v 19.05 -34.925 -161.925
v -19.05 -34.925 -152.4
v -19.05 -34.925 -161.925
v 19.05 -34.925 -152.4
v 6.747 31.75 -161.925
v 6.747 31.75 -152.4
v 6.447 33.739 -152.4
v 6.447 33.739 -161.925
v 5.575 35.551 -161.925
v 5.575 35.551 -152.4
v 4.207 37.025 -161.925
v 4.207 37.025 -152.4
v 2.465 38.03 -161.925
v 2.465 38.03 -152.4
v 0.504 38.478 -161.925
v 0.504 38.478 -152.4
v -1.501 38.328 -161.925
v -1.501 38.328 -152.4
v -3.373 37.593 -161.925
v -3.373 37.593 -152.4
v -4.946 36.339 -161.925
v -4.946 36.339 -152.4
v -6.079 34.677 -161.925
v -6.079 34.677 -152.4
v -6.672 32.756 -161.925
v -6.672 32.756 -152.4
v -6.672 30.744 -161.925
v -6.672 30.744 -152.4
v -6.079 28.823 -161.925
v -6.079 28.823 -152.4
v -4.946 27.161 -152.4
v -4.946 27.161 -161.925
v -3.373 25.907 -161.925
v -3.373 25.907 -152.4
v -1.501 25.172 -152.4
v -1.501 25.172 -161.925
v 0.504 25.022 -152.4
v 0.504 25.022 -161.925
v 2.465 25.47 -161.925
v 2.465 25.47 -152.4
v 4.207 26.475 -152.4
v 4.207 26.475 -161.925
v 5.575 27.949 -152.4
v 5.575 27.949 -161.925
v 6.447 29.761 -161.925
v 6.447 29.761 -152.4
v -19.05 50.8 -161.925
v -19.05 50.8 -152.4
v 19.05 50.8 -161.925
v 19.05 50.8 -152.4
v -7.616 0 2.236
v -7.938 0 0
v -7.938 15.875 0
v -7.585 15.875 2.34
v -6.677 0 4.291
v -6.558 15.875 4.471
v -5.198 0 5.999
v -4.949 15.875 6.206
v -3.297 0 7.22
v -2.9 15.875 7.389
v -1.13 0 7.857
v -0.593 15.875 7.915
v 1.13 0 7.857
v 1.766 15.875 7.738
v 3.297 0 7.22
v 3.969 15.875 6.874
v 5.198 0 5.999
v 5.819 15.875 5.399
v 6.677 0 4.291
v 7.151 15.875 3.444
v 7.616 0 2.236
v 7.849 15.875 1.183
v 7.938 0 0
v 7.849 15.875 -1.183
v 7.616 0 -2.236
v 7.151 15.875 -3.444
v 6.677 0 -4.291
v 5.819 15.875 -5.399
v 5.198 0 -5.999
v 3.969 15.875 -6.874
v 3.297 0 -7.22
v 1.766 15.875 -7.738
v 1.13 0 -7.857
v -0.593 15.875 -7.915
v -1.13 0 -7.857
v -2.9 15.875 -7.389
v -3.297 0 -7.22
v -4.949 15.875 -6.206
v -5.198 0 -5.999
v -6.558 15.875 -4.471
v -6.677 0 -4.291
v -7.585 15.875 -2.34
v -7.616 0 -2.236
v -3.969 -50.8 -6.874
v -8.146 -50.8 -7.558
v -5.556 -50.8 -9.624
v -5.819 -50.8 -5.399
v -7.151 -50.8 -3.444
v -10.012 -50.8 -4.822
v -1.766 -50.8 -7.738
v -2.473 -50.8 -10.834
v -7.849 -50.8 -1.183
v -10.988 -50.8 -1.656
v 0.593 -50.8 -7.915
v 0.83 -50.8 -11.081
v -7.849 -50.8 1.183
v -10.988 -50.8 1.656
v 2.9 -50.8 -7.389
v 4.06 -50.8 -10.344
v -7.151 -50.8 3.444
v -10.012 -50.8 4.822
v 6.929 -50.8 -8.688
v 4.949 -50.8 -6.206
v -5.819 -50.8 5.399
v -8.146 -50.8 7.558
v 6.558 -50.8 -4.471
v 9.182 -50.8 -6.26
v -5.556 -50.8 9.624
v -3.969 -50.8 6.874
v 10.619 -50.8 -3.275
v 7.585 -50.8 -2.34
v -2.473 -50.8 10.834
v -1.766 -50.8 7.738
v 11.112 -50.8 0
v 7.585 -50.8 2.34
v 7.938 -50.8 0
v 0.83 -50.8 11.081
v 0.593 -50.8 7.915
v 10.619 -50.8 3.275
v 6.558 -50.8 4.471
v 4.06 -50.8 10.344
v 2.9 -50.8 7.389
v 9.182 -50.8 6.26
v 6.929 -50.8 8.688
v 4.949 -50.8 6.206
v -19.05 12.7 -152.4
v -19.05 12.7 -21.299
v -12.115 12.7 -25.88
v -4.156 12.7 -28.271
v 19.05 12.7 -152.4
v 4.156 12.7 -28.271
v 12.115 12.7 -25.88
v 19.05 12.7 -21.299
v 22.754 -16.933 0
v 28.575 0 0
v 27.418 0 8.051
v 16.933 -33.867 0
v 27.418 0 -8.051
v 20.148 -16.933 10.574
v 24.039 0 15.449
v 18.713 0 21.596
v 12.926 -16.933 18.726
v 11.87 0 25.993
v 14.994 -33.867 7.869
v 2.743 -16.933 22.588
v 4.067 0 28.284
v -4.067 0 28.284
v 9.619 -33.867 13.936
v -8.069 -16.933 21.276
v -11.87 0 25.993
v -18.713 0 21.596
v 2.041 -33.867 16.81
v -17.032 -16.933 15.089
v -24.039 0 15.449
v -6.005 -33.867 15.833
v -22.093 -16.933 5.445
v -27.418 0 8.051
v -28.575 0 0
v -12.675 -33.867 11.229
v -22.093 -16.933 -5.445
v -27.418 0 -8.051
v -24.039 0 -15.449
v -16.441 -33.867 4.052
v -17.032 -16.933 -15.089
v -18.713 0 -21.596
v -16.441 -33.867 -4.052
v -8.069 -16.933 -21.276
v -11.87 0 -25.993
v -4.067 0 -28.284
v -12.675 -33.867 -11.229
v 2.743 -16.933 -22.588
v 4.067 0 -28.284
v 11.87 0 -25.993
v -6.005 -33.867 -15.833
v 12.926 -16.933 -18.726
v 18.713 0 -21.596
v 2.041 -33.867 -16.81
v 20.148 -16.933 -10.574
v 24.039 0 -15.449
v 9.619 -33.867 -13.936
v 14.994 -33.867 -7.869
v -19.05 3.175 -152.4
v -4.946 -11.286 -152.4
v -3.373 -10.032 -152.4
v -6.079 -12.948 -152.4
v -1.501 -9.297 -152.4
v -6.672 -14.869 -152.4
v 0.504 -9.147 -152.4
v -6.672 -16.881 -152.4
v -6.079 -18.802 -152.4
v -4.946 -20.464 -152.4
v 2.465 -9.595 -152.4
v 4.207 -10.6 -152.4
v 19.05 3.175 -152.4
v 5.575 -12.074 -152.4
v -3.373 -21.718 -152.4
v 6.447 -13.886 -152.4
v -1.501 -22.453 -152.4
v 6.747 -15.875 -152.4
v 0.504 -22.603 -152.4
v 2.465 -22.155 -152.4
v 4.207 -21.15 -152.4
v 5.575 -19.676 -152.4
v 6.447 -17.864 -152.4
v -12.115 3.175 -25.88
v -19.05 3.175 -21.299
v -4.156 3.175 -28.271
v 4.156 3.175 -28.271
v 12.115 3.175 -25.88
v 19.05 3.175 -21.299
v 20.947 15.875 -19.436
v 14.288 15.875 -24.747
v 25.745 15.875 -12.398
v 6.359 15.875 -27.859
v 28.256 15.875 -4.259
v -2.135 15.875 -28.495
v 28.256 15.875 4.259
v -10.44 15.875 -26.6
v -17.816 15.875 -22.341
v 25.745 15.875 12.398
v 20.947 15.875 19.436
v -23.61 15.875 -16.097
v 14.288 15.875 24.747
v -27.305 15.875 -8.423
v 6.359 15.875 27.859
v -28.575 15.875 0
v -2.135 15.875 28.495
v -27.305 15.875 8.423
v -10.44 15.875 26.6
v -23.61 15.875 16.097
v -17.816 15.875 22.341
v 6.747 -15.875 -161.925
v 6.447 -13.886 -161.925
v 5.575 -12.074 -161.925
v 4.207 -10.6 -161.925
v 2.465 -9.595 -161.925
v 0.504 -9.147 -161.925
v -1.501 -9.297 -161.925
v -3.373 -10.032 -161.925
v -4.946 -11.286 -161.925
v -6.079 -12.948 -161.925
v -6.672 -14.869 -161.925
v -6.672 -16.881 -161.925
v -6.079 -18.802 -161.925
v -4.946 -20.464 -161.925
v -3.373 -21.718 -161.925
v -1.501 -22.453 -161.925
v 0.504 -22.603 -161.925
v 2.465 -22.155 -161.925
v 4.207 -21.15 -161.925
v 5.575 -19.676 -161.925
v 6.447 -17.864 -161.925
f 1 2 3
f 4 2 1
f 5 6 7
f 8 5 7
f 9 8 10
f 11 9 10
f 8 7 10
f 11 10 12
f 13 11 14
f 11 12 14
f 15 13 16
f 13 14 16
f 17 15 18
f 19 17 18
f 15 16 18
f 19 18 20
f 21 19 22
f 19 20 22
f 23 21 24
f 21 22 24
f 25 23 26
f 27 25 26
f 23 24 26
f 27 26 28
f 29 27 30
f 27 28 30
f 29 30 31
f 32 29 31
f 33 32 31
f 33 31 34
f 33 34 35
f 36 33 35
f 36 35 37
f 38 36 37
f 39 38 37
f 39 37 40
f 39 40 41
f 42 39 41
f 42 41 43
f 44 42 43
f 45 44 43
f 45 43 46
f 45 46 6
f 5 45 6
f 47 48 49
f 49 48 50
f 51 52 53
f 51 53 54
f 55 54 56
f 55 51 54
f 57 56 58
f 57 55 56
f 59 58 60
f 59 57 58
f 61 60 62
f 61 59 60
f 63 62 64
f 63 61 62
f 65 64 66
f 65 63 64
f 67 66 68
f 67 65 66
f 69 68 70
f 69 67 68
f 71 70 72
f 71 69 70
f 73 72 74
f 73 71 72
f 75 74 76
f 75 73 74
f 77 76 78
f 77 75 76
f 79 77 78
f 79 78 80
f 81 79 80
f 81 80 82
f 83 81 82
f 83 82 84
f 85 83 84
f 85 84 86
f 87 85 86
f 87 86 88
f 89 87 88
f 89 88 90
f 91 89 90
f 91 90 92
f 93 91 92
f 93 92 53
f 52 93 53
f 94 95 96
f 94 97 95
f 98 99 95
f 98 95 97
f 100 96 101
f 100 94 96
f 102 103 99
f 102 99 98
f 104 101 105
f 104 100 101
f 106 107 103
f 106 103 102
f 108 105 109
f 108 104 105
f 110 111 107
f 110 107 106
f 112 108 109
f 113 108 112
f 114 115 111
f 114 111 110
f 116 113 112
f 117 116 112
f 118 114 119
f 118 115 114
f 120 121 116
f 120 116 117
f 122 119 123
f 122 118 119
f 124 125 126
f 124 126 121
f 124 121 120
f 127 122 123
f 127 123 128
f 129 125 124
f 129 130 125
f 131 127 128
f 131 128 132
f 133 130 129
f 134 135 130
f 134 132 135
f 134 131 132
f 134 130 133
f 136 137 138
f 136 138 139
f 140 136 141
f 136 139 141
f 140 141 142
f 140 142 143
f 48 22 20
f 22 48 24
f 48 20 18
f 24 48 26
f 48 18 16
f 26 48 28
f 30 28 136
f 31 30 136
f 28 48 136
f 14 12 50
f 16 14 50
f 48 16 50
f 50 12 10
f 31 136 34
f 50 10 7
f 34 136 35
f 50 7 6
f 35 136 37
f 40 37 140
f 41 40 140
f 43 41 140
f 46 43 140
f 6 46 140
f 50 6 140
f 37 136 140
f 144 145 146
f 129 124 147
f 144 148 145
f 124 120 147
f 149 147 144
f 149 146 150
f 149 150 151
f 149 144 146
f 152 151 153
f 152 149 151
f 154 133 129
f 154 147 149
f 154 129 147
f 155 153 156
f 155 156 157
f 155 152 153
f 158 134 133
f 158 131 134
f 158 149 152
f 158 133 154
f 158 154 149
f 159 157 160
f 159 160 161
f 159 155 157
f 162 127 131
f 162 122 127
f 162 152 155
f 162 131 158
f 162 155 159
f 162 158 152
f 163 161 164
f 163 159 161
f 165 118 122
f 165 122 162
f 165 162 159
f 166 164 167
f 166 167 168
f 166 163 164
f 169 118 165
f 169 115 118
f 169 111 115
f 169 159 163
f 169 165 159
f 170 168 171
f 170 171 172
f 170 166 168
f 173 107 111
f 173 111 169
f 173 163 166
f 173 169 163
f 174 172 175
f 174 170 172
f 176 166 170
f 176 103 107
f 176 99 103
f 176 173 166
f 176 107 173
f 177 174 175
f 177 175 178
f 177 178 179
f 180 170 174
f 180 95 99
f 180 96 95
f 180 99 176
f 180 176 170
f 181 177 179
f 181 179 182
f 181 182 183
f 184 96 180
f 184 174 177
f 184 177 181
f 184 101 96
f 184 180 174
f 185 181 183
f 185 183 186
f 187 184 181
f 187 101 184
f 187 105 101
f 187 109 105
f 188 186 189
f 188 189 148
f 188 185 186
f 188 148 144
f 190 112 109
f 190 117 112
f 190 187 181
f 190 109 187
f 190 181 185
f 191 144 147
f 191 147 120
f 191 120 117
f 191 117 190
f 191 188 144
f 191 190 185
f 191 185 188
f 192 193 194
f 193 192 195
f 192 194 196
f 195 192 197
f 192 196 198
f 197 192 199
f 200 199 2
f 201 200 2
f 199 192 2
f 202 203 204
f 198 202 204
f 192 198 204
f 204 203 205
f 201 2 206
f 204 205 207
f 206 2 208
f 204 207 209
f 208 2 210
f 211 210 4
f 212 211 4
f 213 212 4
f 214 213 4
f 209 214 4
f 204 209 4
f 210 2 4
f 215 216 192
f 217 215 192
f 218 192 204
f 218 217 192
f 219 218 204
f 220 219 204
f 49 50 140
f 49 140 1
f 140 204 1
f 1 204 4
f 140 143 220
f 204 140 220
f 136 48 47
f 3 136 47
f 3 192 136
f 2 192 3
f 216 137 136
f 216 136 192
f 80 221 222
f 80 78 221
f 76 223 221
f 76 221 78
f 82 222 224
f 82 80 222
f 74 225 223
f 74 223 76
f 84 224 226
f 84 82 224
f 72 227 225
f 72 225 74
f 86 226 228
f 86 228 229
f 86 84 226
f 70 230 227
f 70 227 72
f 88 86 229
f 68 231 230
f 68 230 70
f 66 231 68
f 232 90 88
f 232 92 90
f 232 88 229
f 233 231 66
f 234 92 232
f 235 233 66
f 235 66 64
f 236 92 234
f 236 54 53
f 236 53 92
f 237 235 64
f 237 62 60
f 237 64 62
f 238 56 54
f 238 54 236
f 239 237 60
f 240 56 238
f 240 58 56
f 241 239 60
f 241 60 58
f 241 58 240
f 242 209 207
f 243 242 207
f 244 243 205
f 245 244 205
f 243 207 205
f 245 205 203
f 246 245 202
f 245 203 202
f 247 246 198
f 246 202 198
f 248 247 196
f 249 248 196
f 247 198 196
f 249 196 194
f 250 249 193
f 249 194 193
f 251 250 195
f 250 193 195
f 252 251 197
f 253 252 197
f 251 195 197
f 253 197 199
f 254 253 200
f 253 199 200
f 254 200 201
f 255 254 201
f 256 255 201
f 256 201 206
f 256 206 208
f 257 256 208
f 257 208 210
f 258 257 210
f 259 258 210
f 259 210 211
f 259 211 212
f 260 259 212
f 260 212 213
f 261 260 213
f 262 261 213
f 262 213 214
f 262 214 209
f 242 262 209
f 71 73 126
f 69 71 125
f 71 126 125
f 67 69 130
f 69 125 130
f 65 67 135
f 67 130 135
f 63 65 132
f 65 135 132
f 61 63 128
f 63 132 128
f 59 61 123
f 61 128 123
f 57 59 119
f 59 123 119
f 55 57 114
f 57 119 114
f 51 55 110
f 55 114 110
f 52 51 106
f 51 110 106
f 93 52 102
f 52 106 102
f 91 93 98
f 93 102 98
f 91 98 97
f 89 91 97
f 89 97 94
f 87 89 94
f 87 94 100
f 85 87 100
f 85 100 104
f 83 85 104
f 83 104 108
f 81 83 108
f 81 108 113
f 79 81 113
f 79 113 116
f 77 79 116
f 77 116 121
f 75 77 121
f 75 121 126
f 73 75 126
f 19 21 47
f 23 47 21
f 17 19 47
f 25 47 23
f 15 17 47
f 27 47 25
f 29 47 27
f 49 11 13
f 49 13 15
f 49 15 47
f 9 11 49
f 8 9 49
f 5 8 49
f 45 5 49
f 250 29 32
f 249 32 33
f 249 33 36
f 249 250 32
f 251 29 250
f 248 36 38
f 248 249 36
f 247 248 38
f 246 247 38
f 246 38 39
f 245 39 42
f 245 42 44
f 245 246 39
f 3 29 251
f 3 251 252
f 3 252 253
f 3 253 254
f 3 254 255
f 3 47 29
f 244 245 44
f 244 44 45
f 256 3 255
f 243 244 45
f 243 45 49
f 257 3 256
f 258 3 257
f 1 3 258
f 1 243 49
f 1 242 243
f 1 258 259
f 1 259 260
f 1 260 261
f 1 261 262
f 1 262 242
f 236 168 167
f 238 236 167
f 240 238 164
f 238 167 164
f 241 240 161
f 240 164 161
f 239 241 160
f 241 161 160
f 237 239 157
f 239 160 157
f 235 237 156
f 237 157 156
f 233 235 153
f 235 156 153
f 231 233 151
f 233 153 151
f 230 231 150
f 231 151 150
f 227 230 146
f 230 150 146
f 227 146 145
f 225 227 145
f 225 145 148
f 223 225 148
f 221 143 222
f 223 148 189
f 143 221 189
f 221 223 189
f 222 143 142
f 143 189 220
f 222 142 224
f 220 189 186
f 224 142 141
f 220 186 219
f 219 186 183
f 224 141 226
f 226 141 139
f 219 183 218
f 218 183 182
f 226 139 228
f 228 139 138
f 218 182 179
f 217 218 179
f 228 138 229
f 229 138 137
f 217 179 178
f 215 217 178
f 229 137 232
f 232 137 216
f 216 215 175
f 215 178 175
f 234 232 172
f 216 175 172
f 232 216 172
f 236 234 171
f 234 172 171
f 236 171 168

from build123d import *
from build123d import SkipClean  # not in build123d's __all__

# Parameters (mm, degrees)
F0_R      = 28.575
F2_R      = 11.1125
F4_R      = 7.9375
F5_DEPTH  = 50.8010001
F6_R      = 28.575
F6_R_2    = 7.9375
F7_DEPTH  = 15.875
F10_DEPTH = 9.525
F11_W     = 38.1
F11_H     = 85.725
F12_DEPTH = 9.525
F13_R     = 6.746875
F14_DEPTH = 9.526


# Not quite as in the source:
# - after a boolean that leaves OpenCascade's solid faulty, fix() repairs it


with BuildPart() as f3:
    # F0 (on Front) → F3 section 0
    with BuildSketch(Plane.XZ):
        Circle(F0_R)
    # F2 (on offset) → F3 section 1
    with BuildSketch(Plane.XZ.offset(50.8)):
        Circle(F2_R)
    loft()

    # F4 (on face) → F5 (cut, through all)
    with BuildSketch(Plane.XZ.offset(50.8)):
        Circle(F4_R)
    extrude(amount=-F5_DEPTH, mode=Mode.SUBTRACT)

    # F6 (on face) → F7 (join)
    with BuildSketch(Plane(origin=(0, 0, 0), x_dir=(-1, 0, 0), z_dir=(0, 1, 0))):
        Circle(F6_R)
        Circle(F6_R_2, mode=Mode.SUBTRACT)
    with SkipClean():  # cleaning this boolean's faces spoils the solid; the shape is the same uncleaned
        extrude(amount=F7_DEPTH)

    # F9 (on offset) → F10 (join)
    with BuildSketch(Plane.XZ.offset(-3.175)):
        with BuildLine():
            ThreePointArc((19.05, -21.2985474857), (0, -28.575), (-19.05, -21.2985474857))
            Line((-19.05, -21.2985474857), (-19.05, -152.4))
            Line((-19.05, -152.4), (19.05, -152.4))
            Line((19.05, -152.4), (19.05, -21.2985474857))
        make_face()
    extrude(amount=-F10_DEPTH)

    add(f3.part.fix(), mode=Mode.REPLACE)

    # F11 (on face) → F12 (join)
    with BuildSketch(Plane(origin=(0, 0, -152.4), x_dir=(1, 0, 0), z_dir=(0, 0, -1))):
        with Locations((0, -7.9375)):
            Rectangle(F11_W, F11_H)
    extrude(amount=F12_DEPTH)

    add(f3.part.fix(), mode=Mode.REPLACE)

    # F13 (on face) → F14 (cut, through all)
    with BuildSketch(Plane.XY.offset(-152.4)):
        with Locations((0, 31.75)):
            Circle(F13_R)
        with Locations((0, -15.875)):
            Circle(F13_R)
    extrude(amount=-F14_DEPTH, mode=Mode.SUBTRACT)


solid = f3.part
